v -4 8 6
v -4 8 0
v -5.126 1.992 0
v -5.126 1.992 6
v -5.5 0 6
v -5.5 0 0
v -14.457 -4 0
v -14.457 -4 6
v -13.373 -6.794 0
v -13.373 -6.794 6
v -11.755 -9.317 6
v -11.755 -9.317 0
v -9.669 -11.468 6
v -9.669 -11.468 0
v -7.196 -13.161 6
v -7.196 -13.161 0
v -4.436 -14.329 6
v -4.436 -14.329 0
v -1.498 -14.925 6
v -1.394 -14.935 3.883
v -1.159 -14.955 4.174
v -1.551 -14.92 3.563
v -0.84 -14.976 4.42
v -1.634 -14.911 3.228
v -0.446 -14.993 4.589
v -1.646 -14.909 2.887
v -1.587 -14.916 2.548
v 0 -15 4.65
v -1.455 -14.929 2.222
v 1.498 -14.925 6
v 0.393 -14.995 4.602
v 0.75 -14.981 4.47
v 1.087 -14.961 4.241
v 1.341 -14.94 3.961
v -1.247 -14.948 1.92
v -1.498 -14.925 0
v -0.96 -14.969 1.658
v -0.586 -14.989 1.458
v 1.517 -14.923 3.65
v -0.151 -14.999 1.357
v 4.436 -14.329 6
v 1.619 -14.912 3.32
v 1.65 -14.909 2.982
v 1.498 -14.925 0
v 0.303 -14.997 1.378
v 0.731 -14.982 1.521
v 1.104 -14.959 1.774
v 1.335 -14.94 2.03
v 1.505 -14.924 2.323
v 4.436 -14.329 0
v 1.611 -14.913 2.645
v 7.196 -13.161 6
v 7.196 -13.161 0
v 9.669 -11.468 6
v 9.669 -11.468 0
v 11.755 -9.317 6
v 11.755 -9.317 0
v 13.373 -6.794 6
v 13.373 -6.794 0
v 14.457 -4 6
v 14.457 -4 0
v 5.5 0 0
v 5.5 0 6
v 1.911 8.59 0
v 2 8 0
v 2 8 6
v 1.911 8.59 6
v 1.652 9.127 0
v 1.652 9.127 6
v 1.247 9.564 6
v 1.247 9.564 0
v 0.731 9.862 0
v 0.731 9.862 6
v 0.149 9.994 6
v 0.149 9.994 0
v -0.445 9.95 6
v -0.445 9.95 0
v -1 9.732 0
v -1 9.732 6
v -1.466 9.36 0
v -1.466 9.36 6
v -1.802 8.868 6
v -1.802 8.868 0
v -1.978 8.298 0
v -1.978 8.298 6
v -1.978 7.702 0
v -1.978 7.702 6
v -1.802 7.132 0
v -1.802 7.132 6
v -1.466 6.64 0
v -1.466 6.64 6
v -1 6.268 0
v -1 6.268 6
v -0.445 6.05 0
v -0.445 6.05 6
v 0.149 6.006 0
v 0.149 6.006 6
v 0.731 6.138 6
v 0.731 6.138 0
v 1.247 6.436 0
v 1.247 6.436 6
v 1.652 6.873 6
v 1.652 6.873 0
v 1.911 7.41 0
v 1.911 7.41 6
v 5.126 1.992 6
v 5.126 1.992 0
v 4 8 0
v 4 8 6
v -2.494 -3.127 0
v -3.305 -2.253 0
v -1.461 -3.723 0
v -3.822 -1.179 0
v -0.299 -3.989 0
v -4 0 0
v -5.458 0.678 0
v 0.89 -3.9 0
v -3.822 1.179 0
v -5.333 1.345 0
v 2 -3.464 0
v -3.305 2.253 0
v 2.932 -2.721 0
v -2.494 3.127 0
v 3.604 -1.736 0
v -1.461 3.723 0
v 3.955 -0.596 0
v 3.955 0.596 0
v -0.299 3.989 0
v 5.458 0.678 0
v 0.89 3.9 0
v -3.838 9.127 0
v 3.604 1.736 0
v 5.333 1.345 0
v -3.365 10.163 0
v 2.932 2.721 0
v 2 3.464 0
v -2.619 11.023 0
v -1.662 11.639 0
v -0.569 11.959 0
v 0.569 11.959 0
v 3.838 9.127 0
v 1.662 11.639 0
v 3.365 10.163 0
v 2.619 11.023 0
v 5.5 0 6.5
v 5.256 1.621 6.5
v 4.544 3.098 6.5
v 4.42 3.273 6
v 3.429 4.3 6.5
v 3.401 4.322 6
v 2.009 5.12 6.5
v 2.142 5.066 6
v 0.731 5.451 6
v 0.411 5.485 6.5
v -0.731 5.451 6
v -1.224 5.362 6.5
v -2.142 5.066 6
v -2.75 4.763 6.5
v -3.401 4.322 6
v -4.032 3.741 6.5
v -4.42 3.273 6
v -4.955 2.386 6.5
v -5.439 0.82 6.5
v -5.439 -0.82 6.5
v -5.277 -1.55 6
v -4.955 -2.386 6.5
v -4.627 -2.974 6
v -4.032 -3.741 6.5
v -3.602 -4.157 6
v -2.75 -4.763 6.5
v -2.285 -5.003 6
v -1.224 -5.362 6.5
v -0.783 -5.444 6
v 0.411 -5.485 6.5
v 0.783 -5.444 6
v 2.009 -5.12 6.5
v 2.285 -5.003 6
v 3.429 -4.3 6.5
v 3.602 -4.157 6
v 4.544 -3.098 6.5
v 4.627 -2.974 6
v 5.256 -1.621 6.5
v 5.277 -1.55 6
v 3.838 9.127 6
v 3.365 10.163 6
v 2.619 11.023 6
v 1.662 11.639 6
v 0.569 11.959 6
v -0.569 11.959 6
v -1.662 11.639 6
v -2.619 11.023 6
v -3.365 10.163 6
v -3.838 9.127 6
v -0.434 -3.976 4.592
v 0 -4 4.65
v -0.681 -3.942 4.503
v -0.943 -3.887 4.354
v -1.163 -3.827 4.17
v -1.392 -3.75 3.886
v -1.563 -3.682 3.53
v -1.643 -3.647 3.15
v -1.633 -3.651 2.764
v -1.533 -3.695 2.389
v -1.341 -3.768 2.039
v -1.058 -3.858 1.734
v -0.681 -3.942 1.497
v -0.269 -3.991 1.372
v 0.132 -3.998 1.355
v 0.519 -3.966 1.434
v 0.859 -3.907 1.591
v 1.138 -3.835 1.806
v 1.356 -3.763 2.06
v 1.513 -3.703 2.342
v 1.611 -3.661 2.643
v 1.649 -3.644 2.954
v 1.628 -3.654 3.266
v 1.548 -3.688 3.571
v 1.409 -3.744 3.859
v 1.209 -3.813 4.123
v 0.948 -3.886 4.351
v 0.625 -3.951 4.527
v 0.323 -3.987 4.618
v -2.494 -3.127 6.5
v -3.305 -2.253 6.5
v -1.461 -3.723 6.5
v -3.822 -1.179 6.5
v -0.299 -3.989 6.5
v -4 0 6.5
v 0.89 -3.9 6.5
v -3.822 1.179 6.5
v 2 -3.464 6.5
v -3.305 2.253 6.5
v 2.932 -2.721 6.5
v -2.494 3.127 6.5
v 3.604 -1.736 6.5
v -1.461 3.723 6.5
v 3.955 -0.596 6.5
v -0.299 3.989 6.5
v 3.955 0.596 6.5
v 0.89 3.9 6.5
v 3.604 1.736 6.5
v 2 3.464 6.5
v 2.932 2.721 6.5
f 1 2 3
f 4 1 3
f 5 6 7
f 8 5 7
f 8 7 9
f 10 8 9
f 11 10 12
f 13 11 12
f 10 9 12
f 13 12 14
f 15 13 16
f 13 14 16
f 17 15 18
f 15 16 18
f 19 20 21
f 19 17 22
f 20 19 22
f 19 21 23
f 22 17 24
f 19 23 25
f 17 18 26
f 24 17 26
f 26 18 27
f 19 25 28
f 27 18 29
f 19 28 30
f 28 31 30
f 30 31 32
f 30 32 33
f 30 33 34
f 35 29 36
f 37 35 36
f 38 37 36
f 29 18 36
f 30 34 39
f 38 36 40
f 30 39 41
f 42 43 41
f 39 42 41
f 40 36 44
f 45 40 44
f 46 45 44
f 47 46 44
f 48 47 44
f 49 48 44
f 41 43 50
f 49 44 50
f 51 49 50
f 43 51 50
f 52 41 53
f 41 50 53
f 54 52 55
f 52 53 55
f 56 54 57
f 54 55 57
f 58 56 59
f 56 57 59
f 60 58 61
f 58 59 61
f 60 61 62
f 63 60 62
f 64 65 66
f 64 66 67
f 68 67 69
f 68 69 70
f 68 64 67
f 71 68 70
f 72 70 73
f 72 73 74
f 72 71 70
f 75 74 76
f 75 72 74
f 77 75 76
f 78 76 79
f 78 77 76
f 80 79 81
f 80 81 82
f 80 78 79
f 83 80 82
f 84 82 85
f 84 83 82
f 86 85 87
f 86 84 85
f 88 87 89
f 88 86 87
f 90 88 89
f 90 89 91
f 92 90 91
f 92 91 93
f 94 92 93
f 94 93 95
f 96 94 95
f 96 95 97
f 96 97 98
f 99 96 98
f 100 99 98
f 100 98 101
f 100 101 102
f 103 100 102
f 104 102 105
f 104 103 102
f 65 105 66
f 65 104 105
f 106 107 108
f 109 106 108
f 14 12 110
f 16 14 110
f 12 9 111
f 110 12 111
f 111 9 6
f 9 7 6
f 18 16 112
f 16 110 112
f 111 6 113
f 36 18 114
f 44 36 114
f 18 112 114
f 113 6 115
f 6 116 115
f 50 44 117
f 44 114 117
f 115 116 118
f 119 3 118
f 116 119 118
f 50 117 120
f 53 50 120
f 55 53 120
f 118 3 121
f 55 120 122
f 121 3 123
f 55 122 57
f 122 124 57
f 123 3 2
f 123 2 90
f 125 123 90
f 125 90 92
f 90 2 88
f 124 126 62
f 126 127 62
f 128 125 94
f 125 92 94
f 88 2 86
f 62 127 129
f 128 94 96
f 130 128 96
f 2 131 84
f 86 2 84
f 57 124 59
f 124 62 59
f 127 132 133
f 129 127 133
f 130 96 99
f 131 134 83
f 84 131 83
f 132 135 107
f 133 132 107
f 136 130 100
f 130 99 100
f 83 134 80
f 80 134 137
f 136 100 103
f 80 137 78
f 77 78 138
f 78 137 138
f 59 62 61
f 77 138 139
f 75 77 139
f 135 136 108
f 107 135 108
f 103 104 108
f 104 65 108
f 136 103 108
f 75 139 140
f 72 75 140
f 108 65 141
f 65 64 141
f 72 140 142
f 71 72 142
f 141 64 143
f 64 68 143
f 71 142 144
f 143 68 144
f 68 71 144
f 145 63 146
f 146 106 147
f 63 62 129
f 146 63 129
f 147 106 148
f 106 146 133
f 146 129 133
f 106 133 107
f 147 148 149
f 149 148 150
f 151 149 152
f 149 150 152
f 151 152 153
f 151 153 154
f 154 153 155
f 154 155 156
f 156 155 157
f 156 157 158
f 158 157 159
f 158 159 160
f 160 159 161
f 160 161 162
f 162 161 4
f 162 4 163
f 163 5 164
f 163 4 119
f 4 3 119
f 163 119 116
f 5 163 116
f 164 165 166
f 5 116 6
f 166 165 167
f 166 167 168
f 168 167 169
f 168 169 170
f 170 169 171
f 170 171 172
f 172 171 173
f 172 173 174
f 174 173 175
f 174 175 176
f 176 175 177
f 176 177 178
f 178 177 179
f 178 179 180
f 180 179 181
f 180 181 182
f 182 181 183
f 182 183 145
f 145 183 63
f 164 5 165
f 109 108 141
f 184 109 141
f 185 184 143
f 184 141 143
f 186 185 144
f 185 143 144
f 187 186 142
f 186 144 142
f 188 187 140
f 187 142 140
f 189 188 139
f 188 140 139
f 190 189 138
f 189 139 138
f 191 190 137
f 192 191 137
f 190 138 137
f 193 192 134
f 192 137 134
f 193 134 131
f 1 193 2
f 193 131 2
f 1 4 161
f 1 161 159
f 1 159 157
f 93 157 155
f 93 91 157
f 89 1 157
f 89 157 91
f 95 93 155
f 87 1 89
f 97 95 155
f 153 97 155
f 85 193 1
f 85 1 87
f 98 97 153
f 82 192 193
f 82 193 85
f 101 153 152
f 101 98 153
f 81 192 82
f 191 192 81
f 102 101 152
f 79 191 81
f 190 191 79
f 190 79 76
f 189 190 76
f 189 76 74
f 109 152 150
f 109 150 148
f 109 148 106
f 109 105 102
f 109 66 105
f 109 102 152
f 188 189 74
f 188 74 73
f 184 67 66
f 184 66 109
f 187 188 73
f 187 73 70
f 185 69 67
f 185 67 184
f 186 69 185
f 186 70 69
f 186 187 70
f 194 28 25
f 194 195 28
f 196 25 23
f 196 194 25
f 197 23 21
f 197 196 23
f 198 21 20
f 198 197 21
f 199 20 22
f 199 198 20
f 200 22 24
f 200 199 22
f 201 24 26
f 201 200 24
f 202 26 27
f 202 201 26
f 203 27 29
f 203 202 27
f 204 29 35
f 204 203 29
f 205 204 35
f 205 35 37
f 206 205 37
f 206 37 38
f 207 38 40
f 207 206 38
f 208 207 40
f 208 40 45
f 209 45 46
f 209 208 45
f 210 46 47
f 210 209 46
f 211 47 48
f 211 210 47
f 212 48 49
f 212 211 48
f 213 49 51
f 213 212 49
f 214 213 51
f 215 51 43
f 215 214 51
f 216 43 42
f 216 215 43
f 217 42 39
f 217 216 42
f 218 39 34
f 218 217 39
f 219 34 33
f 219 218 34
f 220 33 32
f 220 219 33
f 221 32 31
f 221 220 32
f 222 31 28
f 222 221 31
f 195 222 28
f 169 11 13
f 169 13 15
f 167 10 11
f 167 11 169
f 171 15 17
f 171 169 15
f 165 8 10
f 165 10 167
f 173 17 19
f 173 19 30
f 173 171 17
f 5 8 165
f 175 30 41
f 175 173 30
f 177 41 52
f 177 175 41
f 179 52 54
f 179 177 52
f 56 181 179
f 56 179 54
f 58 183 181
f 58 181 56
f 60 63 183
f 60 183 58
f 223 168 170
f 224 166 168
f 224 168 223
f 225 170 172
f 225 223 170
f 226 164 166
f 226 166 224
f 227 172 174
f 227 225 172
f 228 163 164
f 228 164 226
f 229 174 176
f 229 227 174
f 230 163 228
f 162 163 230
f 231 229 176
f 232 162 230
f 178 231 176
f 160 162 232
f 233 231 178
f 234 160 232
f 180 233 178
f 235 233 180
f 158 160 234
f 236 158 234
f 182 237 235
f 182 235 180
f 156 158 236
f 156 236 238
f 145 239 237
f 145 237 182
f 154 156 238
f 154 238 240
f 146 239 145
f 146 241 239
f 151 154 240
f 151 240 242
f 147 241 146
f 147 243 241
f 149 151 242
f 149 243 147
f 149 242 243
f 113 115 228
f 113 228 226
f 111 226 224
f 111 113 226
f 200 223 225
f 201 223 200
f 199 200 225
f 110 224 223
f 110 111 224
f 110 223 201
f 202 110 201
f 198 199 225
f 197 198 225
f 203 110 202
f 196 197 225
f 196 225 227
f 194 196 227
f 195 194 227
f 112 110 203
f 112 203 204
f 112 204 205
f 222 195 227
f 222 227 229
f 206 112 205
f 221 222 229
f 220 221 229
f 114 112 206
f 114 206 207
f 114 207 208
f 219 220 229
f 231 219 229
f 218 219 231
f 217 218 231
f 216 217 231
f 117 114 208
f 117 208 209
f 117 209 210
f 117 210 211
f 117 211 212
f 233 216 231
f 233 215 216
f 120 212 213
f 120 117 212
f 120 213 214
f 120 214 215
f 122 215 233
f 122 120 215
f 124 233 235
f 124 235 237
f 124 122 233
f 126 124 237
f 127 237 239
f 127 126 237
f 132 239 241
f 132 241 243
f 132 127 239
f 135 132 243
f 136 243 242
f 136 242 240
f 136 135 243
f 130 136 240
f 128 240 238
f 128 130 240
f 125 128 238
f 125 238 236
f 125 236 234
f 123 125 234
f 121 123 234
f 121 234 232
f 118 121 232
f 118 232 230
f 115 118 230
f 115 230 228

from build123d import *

# Parameters (mm, degrees)
SKETCH1_R             = 2
BOSS_EXTRUDE1_DEPTH   = 6
BOSS_EXTRUDE1_2_DEPTH = 6
SKETCH2_R             = 5.5
SKETCH2_R_2           = 4
BOSS_EXTRUDE2_DEPTH   = 6.5


with BuildPart() as part:
    # Sketch1 → Boss-Extrude1 (new body)
    with BuildSketch(Plane.XY):
        with BuildLine():
            Line((-4, 8), (-5.126415094, 1.99245283))
            ThreePointArc((-5.126415094, 1.99245283), (0, 5.5), (5.126415094, 1.99245283))
            Line((5.126415094, 1.99245283), (4, 8))
            ThreePointArc((4, 8), (0, 12), (-4, 8))
        make_face()
        with Locations((0, 8)):
            Circle(SKETCH1_R, mode=Mode.SUBTRACT)
    extrude(amount=BOSS_EXTRUDE1_DEPTH)



with BuildPart() as body_2:
    # Sketch1 → Boss-Extrude1 2 (new body)
    with BuildSketch(Plane.XY):
        with BuildLine():
            Line((-5.5, 0), (-14.456832295, -4))
            ThreePointArc((-14.456832295, -4), (0, -15), (14.456832295, -4))
            Line((14.456832295, -4), (5.5, 0))
            ThreePointArc((5.5, 0), (0, -5.5), (-5.5, 0))
        make_face()
    extrude(amount=BOSS_EXTRUDE1_2_DEPTH)


with BuildPart() as part_1:
    add(part.part)

    add(body_2.part)  # Boss-Extrude2 merges body 2
    # Sketch2 → Boss-Extrude2 (add)
    with BuildSketch(Plane.XY):
        Circle(SKETCH2_R)
        with Locations(Location((0, 0, 0), (0, 0, 180))):
            Circle(SKETCH2_R_2, mode=Mode.SUBTRACT)
    extrude(amount=BOSS_EXTRUDE2_DEPTH)

    # Sketch4 → M4 Tapped Hole1 (revolve, cut)
    with BuildSketch(Plane(origin=(0, 0, 3), x_dir=(0, 0, 1), z_dir=(1, 0, 0))):
        Polygon((0, 0), (0, 21.091420021), (1.65, 20.1), (1.65, 0), align=None)
    revolve(axis=Axis((0, 6.35, 3), (0, -1, 0)), mode=Mode.SUBTRACT)


solid = part_1.part
